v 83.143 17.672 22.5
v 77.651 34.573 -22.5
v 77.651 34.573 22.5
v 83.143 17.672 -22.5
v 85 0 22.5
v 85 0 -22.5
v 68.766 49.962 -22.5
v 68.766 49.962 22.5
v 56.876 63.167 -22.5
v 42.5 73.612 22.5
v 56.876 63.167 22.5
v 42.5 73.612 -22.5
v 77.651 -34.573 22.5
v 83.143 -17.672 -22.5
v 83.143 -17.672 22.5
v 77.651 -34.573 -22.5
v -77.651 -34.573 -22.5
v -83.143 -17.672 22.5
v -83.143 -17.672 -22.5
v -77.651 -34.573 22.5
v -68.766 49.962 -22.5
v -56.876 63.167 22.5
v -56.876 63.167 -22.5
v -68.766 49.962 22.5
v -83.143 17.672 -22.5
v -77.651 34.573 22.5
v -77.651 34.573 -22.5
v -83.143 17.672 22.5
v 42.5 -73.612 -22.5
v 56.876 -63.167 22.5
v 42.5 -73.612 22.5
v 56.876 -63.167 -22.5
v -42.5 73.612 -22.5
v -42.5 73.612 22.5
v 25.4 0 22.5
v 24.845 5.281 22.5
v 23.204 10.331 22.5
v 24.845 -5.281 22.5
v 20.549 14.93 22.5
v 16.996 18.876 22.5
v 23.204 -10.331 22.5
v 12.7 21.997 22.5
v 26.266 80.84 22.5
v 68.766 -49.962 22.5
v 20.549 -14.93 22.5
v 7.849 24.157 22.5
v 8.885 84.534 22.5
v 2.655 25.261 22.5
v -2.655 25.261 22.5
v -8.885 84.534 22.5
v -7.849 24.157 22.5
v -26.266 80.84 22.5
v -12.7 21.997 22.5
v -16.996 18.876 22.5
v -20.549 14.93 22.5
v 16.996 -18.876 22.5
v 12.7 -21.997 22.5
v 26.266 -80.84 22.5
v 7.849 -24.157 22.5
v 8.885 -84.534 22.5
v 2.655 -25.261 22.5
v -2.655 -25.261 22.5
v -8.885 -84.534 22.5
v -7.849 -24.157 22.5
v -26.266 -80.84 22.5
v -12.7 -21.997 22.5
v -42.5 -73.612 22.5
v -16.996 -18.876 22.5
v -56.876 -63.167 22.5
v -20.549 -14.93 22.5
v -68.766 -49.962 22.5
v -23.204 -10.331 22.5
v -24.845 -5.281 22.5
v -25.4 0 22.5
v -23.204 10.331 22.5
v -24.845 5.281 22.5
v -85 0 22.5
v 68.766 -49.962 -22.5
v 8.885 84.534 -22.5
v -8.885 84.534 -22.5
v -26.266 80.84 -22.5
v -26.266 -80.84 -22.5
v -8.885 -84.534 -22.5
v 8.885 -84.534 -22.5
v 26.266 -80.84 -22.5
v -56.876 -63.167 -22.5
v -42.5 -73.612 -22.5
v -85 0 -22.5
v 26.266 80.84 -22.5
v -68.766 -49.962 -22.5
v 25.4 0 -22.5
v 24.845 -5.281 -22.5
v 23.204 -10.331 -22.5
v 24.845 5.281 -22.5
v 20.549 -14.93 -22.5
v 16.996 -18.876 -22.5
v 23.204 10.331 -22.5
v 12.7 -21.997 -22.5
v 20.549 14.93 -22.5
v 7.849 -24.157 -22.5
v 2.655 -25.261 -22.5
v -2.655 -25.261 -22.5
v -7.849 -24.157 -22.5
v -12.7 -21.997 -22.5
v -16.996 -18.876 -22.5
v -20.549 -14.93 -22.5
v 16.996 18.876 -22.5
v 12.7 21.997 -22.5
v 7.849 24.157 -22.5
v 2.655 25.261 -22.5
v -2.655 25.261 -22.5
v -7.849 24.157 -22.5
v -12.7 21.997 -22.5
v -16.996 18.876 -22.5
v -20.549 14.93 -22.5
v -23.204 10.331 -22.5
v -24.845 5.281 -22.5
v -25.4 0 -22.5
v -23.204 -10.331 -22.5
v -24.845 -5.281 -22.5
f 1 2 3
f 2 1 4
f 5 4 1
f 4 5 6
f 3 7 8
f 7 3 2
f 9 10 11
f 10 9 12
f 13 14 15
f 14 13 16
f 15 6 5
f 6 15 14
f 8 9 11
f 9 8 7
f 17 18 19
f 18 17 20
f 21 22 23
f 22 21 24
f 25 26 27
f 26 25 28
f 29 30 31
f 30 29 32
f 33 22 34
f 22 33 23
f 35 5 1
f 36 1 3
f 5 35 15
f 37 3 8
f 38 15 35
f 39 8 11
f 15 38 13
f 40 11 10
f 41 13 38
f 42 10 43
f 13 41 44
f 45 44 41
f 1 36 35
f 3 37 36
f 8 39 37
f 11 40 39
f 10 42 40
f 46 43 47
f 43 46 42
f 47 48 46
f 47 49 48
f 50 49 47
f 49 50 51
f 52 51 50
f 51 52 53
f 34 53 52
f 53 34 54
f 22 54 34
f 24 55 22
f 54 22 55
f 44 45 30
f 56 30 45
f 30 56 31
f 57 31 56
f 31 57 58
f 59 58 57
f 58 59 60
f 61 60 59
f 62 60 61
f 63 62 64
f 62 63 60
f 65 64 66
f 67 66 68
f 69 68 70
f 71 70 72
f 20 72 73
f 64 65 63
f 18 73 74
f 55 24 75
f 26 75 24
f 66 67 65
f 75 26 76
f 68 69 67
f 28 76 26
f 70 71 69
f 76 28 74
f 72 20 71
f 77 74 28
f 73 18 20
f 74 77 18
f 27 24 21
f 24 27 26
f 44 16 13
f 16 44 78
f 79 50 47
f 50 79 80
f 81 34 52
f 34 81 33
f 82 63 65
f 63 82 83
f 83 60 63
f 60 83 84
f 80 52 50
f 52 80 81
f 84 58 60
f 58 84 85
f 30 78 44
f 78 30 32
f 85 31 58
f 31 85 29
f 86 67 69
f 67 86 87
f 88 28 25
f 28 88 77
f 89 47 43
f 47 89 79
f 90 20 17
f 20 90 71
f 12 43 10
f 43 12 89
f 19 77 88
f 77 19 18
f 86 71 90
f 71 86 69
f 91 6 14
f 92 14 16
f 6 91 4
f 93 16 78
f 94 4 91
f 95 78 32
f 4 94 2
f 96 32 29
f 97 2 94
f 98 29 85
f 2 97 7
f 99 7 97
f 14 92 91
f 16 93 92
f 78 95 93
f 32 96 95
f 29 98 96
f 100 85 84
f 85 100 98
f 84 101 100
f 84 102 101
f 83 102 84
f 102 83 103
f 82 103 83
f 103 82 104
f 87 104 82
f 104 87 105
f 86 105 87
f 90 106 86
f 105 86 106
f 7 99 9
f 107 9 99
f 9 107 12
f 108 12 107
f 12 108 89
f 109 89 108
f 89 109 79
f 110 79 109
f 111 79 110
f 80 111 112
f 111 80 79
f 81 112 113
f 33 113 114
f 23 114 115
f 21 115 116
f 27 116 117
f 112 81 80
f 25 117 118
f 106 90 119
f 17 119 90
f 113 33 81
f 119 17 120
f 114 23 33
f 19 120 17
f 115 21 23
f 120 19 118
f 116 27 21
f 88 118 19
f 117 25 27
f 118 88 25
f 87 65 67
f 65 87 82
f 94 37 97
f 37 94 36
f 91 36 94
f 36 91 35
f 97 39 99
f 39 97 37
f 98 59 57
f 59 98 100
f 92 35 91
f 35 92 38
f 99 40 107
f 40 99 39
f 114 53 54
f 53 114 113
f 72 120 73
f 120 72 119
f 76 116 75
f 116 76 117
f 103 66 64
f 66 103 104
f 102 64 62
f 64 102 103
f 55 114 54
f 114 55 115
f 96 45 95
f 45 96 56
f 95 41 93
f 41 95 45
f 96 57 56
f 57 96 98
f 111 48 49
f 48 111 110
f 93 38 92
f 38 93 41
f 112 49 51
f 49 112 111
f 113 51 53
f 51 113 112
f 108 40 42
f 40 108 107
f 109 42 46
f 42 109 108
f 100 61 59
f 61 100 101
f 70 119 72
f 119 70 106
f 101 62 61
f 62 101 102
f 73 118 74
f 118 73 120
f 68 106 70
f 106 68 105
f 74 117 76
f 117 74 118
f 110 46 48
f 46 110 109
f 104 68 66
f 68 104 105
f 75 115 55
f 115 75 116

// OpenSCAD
total_len=45;
diam_ex1 = 85;
diam_ex2 = 32;
diametro_interior = 25.4;
diametro_cabeza_chicote = 5;
profundidad_ranura_chic = 2;



radio_interior = diametro_interior / 2;
radio_ex1 = diam_ex1 / 2;
radio_ex2 = diam_ex2 / 2;

module barra_hueca() {
    difference() {
        cylinder(h=total_len,   r=diam_ex1, center=true);
        cylinder(h=total_len+1, r=diametro_interior, center=true);
    }
}

barra_hueca();
